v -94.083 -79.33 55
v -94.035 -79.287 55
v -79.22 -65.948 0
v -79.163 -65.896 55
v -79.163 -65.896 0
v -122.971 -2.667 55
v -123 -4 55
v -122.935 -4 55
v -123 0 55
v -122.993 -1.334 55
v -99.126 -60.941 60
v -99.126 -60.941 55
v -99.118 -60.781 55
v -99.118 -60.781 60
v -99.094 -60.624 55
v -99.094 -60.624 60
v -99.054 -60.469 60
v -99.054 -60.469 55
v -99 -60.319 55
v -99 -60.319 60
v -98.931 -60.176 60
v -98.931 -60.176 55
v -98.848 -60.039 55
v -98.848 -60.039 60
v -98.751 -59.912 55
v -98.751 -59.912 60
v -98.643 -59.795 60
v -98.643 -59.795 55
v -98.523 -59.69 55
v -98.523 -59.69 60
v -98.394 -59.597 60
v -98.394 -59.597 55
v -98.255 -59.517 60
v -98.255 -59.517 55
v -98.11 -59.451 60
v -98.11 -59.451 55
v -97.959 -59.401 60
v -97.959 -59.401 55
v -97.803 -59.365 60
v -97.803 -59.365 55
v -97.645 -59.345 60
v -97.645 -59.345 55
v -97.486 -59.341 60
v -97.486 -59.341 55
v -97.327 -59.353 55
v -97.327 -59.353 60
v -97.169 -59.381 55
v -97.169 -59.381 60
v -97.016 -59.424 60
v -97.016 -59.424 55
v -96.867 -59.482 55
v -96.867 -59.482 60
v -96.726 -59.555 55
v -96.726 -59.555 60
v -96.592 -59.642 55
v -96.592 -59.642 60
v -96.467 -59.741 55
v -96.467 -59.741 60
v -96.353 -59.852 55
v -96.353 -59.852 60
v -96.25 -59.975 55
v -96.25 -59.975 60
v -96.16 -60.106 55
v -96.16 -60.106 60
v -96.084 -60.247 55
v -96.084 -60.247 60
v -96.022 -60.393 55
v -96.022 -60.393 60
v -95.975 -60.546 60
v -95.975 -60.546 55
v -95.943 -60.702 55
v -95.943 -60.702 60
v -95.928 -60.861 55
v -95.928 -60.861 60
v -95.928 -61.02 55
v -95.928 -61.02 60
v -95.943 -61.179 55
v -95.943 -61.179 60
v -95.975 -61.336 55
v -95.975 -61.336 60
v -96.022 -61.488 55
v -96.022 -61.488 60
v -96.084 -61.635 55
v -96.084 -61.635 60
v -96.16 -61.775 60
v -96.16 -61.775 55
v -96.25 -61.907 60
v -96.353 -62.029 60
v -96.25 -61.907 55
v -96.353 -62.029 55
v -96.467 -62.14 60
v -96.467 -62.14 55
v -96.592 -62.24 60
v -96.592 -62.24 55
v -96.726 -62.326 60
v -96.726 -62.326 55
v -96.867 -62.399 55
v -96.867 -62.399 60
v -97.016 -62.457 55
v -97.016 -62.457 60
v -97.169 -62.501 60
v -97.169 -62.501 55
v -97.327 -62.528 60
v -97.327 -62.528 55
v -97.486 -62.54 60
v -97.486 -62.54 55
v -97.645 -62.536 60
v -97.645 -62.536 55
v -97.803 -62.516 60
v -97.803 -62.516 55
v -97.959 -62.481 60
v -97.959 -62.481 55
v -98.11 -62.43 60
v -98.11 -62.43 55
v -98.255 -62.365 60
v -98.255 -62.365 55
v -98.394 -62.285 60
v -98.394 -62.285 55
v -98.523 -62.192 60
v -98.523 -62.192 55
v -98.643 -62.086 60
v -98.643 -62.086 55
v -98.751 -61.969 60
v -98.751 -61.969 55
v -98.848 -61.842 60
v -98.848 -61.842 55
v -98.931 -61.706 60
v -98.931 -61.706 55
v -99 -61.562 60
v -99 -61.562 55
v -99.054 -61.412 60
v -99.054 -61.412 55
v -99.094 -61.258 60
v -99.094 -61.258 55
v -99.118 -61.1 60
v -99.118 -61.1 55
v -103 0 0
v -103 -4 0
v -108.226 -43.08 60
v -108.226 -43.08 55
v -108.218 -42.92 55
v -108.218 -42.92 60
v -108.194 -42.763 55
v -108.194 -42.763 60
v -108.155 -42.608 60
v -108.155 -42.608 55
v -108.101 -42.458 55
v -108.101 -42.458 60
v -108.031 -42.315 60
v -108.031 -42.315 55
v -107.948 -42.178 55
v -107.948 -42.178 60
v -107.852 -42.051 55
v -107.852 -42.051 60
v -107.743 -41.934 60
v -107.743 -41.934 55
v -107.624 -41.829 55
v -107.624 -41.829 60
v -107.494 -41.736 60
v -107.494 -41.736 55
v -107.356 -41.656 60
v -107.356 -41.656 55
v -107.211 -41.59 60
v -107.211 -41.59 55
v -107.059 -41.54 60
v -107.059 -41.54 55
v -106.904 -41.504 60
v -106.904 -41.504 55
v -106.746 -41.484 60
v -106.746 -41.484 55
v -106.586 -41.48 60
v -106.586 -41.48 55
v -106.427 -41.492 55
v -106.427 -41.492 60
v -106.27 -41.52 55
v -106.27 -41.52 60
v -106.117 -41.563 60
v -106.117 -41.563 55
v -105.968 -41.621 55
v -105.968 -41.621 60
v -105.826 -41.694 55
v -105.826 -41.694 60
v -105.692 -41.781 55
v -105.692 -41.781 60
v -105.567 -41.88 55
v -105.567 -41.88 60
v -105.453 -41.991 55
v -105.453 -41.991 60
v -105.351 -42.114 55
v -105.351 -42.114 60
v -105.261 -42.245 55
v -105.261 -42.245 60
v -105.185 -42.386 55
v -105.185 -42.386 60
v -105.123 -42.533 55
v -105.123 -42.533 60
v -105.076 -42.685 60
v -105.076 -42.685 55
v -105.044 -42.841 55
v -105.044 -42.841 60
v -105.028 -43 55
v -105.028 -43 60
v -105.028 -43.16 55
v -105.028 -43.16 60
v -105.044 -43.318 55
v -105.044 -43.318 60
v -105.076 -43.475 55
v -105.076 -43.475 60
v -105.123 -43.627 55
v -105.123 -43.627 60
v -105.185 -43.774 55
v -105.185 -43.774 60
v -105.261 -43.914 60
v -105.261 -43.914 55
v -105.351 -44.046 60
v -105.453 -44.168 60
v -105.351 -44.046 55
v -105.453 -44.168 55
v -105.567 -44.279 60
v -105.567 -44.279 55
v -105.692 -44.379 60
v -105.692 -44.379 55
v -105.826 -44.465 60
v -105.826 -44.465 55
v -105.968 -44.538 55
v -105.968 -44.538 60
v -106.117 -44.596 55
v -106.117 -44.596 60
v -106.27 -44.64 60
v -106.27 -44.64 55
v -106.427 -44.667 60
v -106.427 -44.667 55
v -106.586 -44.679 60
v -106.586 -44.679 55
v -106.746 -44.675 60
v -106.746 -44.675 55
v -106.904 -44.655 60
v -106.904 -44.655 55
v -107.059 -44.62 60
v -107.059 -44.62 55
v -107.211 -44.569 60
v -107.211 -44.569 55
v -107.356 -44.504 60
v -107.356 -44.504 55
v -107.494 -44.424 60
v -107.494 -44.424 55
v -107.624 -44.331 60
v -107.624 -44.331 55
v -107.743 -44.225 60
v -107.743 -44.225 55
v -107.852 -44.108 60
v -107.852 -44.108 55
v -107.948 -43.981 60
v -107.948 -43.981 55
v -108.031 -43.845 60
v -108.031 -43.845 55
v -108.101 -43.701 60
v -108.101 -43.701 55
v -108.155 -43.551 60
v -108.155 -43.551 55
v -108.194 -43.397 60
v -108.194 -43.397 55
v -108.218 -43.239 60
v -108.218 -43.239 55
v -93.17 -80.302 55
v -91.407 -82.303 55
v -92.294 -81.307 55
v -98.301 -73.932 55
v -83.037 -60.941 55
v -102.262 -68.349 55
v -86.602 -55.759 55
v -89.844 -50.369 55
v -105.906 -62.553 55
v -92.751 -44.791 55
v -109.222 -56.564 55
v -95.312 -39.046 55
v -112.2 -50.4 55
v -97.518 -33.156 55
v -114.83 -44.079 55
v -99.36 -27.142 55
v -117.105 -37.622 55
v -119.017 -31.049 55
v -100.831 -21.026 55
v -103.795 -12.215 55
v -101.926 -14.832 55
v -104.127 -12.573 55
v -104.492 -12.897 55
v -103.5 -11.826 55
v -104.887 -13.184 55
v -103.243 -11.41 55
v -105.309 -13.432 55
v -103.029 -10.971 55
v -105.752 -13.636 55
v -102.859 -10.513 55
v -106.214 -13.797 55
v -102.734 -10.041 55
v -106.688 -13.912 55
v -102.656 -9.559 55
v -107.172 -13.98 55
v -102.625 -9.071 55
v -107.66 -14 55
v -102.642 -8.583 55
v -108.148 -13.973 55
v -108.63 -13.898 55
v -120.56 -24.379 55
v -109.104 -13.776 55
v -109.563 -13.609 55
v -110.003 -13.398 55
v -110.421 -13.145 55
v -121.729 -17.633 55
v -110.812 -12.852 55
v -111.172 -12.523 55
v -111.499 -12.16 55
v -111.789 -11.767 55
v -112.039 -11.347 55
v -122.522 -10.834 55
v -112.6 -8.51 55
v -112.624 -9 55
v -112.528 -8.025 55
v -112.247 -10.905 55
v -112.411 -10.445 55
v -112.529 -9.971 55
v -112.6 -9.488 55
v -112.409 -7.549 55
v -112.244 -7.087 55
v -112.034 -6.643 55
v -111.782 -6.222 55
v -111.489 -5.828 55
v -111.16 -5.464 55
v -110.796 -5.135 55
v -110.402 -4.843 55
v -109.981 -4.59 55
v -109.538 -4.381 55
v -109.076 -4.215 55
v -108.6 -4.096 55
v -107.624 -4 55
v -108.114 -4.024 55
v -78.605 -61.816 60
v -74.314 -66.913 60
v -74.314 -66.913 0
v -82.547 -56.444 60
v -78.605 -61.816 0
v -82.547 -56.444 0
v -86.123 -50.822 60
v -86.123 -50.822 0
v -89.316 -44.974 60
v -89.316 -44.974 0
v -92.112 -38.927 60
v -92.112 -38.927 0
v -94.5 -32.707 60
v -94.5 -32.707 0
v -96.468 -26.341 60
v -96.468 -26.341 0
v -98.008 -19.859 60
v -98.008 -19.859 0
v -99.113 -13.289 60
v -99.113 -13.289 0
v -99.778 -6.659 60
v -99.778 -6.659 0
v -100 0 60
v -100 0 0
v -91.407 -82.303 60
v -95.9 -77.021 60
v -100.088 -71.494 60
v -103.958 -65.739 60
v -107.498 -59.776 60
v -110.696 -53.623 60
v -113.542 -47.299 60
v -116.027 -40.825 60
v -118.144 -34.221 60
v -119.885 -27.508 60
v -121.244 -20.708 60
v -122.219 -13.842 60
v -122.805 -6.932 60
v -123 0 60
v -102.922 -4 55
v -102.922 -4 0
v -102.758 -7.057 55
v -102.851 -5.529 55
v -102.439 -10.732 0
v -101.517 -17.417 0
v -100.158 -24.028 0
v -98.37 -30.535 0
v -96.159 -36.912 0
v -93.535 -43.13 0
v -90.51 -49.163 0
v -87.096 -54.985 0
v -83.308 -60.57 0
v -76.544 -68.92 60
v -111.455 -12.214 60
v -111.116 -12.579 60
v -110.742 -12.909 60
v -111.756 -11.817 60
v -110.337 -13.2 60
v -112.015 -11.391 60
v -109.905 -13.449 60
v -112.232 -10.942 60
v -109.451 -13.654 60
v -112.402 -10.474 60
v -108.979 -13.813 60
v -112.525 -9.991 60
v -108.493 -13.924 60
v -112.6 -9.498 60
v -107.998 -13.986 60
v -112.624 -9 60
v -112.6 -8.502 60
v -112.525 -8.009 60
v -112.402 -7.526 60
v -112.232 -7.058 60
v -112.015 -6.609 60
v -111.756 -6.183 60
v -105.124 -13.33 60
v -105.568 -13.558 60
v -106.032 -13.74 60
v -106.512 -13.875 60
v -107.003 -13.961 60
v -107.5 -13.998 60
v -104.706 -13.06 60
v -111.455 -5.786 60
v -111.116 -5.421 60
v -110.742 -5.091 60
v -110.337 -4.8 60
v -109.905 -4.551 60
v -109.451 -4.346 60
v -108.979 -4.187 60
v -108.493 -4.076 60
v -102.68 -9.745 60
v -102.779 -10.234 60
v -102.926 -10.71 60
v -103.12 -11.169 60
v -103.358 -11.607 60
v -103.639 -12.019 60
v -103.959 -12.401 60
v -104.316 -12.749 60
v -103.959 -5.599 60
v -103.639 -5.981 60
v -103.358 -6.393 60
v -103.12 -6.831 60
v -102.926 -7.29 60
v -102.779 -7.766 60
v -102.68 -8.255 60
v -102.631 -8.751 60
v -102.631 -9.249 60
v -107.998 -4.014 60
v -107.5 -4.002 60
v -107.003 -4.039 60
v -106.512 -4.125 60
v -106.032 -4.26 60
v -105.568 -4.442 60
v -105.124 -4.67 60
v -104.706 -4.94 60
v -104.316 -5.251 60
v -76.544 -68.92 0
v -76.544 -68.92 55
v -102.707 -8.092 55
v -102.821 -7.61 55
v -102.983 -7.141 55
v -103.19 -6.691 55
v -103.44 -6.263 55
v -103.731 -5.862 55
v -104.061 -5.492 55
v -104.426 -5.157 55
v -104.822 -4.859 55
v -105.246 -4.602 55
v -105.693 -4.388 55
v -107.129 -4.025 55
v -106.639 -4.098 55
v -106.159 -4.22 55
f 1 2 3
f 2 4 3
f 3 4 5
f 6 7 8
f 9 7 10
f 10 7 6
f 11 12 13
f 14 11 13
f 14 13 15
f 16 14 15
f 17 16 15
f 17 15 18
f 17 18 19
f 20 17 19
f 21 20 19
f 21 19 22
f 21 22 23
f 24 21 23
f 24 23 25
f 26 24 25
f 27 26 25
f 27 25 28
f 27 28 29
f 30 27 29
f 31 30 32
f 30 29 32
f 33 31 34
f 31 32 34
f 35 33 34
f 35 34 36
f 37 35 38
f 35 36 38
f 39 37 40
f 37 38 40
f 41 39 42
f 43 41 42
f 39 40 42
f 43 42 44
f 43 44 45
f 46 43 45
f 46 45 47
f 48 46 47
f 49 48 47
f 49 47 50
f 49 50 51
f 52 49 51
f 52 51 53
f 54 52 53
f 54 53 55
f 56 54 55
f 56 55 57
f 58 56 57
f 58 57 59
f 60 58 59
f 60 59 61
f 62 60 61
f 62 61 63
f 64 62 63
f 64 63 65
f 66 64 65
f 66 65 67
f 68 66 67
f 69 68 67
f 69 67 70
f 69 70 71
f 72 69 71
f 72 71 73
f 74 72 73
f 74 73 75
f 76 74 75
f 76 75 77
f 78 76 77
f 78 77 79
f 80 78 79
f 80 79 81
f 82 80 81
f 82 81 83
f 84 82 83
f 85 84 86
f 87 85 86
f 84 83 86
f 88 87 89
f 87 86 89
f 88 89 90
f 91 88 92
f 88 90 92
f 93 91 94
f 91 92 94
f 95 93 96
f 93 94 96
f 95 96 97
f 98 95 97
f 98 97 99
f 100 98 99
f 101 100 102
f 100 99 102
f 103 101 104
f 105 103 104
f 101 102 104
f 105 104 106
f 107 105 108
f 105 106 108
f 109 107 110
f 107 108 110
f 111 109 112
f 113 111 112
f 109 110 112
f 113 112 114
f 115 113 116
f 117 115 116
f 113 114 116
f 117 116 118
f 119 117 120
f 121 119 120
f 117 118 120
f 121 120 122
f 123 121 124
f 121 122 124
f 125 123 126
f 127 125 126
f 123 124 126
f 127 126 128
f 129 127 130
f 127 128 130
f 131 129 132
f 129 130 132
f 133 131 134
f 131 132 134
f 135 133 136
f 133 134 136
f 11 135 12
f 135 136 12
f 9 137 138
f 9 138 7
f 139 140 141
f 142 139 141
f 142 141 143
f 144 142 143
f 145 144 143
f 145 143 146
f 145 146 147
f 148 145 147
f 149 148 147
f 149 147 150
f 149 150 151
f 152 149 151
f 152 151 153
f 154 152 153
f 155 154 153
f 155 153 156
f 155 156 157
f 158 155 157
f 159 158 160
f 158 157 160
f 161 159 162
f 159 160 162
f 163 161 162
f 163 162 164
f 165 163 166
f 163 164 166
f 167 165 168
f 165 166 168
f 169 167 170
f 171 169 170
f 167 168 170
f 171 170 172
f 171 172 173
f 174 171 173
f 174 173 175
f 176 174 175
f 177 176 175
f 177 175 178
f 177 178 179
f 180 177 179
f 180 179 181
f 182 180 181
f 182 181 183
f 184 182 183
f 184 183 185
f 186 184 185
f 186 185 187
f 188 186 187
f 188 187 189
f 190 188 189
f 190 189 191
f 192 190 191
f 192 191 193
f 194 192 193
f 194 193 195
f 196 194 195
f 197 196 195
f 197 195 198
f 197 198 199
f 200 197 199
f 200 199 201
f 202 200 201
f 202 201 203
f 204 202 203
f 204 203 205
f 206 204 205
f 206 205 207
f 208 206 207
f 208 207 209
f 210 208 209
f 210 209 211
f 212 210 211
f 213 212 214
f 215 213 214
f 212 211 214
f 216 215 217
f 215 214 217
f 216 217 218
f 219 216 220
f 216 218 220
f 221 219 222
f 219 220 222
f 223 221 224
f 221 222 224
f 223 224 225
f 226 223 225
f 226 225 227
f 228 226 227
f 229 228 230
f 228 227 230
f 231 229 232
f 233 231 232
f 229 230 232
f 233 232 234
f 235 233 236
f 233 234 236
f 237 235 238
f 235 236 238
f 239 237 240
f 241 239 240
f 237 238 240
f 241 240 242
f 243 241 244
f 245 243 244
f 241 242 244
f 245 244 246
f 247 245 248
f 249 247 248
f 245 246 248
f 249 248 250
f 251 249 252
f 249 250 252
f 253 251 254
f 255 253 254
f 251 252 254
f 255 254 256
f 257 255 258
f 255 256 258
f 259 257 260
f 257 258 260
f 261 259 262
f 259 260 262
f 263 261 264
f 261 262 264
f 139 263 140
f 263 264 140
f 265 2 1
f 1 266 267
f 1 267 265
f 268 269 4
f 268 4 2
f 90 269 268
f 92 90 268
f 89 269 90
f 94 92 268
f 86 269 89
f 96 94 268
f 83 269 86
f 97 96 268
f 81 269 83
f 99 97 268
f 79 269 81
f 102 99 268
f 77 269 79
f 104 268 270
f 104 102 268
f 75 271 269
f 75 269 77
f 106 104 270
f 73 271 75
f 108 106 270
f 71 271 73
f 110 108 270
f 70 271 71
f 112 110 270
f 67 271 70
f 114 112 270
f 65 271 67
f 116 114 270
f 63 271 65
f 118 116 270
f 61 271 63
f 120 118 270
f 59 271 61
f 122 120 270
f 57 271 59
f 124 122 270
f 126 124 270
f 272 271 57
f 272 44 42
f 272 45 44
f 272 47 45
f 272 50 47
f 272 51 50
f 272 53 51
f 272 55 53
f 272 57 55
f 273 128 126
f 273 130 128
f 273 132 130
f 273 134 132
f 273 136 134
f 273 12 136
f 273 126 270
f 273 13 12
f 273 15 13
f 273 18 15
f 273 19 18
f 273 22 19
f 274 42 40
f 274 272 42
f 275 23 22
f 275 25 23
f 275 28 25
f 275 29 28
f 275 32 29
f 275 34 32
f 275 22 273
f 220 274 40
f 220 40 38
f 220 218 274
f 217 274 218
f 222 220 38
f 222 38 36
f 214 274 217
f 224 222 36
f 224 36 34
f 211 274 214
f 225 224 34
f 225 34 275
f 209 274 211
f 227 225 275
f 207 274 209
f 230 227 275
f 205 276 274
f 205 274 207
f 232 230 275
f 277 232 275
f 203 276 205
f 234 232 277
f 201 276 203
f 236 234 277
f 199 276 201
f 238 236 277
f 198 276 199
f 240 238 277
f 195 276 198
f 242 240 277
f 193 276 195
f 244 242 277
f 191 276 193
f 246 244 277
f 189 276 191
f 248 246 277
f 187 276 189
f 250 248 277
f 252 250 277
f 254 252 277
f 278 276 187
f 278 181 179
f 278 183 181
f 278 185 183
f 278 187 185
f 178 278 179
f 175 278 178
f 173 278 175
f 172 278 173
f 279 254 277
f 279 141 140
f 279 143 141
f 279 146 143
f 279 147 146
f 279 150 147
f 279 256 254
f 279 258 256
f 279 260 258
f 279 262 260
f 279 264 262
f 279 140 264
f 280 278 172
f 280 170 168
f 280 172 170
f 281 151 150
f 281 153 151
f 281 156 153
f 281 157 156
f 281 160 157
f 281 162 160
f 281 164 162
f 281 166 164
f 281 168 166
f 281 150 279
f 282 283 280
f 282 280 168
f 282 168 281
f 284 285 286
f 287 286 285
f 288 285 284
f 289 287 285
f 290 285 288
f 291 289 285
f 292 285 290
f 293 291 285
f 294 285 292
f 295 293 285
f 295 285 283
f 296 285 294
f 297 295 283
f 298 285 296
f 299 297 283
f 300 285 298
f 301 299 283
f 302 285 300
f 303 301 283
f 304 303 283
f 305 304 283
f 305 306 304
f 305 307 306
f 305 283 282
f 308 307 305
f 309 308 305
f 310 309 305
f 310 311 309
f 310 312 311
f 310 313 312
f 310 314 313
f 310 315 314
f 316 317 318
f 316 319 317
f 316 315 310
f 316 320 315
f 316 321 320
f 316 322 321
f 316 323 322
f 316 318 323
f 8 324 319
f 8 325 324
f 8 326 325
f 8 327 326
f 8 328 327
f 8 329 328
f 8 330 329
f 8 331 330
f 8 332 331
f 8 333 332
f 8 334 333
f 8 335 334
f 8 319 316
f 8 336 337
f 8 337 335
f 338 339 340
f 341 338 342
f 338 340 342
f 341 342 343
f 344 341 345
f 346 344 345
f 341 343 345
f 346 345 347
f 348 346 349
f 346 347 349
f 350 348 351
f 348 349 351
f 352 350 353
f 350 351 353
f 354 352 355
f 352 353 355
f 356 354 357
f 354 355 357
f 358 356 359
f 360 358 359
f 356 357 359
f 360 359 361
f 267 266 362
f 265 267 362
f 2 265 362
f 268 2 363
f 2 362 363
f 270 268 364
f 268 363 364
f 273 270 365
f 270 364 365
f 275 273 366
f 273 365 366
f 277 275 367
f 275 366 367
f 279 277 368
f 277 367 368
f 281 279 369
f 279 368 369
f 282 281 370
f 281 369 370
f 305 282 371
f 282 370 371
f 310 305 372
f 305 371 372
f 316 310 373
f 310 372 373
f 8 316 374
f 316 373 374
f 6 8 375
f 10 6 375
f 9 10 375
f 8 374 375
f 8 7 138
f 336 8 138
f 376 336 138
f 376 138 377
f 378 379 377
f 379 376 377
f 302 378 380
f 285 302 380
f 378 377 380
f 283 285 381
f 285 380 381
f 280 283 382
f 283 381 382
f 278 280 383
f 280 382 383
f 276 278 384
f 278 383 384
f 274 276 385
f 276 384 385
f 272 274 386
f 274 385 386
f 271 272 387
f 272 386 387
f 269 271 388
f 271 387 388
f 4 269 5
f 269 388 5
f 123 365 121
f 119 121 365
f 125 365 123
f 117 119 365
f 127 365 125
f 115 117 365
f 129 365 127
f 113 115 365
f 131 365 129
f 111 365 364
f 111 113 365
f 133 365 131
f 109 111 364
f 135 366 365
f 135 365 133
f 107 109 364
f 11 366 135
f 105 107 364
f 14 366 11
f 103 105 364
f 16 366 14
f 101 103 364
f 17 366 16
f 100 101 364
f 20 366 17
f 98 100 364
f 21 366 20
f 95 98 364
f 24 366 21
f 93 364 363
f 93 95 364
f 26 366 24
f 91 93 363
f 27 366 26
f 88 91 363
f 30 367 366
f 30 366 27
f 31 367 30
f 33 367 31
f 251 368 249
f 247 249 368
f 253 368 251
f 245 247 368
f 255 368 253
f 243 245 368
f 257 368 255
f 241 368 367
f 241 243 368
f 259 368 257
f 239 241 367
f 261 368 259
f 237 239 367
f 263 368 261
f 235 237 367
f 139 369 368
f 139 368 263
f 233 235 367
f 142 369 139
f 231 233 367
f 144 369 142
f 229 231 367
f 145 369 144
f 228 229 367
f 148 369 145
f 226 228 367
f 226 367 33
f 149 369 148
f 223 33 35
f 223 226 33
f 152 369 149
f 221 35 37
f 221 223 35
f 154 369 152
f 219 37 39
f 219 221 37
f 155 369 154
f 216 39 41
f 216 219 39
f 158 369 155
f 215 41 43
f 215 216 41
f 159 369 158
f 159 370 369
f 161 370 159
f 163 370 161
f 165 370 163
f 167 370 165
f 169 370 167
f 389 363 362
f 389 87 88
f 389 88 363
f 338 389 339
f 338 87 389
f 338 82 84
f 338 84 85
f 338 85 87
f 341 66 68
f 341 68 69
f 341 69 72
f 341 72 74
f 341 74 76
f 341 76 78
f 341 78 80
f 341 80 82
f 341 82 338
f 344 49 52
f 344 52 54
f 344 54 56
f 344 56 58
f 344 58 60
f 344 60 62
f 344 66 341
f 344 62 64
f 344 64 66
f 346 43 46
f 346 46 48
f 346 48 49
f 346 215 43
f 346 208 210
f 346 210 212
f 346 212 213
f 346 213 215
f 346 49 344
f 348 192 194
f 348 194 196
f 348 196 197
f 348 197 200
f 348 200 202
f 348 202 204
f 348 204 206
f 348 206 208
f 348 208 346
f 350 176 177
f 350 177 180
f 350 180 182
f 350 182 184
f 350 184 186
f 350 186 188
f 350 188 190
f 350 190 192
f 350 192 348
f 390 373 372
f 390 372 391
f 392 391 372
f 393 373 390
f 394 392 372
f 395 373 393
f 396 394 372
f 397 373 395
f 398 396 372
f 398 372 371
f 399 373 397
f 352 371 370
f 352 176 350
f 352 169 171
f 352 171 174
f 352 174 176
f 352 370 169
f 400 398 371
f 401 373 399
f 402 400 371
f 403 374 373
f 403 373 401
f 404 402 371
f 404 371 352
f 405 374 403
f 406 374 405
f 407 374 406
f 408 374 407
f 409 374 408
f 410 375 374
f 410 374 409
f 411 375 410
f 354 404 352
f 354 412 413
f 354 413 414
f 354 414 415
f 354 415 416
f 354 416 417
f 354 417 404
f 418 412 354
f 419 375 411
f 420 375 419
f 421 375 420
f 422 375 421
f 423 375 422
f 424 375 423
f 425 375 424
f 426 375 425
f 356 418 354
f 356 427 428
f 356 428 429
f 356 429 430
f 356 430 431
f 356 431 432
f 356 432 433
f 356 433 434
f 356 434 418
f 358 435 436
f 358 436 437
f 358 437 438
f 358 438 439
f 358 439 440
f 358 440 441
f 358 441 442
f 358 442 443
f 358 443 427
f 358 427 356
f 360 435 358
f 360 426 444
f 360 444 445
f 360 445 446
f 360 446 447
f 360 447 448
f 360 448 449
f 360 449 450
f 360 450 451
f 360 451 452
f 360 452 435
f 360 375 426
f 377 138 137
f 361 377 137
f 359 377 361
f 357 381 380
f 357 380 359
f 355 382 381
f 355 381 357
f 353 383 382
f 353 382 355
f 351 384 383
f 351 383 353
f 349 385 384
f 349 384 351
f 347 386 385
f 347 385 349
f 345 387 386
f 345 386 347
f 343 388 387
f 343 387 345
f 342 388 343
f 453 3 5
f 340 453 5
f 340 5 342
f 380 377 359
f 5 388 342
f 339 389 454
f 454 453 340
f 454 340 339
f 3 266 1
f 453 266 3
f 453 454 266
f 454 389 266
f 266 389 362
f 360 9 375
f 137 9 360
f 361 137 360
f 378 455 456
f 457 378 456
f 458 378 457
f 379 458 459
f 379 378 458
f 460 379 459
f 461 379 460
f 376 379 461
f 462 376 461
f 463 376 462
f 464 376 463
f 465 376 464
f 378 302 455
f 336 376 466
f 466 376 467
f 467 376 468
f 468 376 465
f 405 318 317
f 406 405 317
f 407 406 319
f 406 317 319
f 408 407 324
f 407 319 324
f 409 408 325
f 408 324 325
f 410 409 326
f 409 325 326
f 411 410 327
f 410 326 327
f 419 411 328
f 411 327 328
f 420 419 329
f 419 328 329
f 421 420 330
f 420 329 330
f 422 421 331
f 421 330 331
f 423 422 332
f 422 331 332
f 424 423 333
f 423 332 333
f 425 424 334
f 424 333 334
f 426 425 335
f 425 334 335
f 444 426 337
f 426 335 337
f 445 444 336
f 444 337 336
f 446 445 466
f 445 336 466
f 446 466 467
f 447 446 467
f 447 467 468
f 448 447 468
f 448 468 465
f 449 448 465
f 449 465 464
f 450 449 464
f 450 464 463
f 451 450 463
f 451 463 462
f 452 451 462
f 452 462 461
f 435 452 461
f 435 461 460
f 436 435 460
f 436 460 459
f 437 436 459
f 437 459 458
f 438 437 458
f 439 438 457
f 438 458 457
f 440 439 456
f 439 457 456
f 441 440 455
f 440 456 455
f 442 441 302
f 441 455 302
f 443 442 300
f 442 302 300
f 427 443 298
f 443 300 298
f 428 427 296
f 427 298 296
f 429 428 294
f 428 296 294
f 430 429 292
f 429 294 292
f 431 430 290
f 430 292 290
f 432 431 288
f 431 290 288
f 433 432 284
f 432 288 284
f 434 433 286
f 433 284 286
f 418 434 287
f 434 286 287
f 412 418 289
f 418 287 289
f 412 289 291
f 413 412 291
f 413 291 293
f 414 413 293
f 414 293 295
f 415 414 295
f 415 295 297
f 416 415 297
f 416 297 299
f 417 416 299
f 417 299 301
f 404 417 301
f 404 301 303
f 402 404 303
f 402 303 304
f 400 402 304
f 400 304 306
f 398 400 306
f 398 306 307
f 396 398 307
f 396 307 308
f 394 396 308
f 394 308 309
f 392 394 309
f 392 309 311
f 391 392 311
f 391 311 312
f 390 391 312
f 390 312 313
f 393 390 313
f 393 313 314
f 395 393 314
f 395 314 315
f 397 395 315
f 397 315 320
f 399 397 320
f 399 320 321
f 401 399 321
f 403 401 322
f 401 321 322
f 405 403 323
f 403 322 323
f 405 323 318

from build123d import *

# Parameters (mm, degrees)
EXTRUDE_1_DEPTH     = 60
EXTRUDE_2_DEPTH     = 5
SKETCH_4_R          = 1.6
CUT_EXTRUDE_1_DEPTH = 158.885383869
EXTRUDE_3_DEPTH     = 4
EXTRUDE_4_DEPTH     = 4
SKETCH_7_R          = 5
CUT_EXTRUDE_2_DEPTH = 158.885383869


with BuildPart() as part:
    # 草图1 → 凸台-拉伸1 (new body)
    with BuildSketch(Plane.XY):
        with BuildLine():
            Line((-100, 0), (-103, 0))
            ThreePointArc((-103, 0), (-96.158783929, -36.911898803), (-76.543917024, -68.920452455))
            Line((-76.543917024, -68.920452455), (-74.314482548, -66.913060636))
            ThreePointArc((-74.314482548, -66.913060636), (-93.35804265, -35.836794955), (-100, 0))
        make_face()
    extrude(amount=EXTRUDE_1_DEPTH)

    # 草图2 → 凸台-拉伸2 (add)
    with BuildSketch(Plane.XY.offset(60)):
        with BuildLine():
            Line((-75.335122837, -67.83204928), (-91.406813534, -82.303064582))
            ThreePointArc((-91.406813534, -82.303064582), (-114.830392459, -44.079257794), (-123, 0))
            Line((-123, 0), (-101.373406978, 0))
            ThreePointArc((-101.373406978, 0), (-94.640228522, -36.328979997), (-75.335122837, -67.83204928))
        make_face()
    extrude(amount=-EXTRUDE_2_DEPTH)

    # 草图4 → 切除-拉伸1 (cut, through all)
    with BuildSketch(Plane(origin=(0, 0, 55), x_dir=(-1, 0, 0), z_dir=(0, 0, -1))):
        with Locations((97.525531058, -60.940715387)):
            Circle(SKETCH_4_R)
        with Locations((106.626143275, -43.079758243)):
            Circle(SKETCH_4_R)
    extrude(amount=-CUT_EXTRUDE_1_DEPTH, mode=Mode.SUBTRACT)

    # 草图5 → 凸台-拉伸3 (add)
    with BuildSketch(Plane(origin=(0, 0, 0), x_dir=(1, 0, 0), z_dir=(0, 1, 0))):
        Polygon((-103, 0), (-123, -55), (-100, -55), (-100, 0), align=None)
    extrude(amount=-EXTRUDE_3_DEPTH)

    # 草图6 → 凸台-拉伸4 (add)
    with BuildSketch(Plane(origin=(0, 0, 0), x_dir=(0, 0, -1), z_dir=(0.6691306063588633, -0.7431448254773898, 0))):
        Polygon((-55, -123), (0, -103), (0, -100), (-55, -100), align=None)
    extrude(amount=-EXTRUDE_4_DEPTH)

    # 草图7 → 切除-拉伸2 (cut, through all)
    with BuildSketch(Plane(origin=(0, 0, 55), x_dir=(-1, 0, 0), z_dir=(0, 0, -1))):
        with Locations((107.624346688, -9)):
            Circle(SKETCH_7_R)
    extrude(amount=-CUT_EXTRUDE_2_DEPTH, mode=Mode.SUBTRACT)


solid = part.part
